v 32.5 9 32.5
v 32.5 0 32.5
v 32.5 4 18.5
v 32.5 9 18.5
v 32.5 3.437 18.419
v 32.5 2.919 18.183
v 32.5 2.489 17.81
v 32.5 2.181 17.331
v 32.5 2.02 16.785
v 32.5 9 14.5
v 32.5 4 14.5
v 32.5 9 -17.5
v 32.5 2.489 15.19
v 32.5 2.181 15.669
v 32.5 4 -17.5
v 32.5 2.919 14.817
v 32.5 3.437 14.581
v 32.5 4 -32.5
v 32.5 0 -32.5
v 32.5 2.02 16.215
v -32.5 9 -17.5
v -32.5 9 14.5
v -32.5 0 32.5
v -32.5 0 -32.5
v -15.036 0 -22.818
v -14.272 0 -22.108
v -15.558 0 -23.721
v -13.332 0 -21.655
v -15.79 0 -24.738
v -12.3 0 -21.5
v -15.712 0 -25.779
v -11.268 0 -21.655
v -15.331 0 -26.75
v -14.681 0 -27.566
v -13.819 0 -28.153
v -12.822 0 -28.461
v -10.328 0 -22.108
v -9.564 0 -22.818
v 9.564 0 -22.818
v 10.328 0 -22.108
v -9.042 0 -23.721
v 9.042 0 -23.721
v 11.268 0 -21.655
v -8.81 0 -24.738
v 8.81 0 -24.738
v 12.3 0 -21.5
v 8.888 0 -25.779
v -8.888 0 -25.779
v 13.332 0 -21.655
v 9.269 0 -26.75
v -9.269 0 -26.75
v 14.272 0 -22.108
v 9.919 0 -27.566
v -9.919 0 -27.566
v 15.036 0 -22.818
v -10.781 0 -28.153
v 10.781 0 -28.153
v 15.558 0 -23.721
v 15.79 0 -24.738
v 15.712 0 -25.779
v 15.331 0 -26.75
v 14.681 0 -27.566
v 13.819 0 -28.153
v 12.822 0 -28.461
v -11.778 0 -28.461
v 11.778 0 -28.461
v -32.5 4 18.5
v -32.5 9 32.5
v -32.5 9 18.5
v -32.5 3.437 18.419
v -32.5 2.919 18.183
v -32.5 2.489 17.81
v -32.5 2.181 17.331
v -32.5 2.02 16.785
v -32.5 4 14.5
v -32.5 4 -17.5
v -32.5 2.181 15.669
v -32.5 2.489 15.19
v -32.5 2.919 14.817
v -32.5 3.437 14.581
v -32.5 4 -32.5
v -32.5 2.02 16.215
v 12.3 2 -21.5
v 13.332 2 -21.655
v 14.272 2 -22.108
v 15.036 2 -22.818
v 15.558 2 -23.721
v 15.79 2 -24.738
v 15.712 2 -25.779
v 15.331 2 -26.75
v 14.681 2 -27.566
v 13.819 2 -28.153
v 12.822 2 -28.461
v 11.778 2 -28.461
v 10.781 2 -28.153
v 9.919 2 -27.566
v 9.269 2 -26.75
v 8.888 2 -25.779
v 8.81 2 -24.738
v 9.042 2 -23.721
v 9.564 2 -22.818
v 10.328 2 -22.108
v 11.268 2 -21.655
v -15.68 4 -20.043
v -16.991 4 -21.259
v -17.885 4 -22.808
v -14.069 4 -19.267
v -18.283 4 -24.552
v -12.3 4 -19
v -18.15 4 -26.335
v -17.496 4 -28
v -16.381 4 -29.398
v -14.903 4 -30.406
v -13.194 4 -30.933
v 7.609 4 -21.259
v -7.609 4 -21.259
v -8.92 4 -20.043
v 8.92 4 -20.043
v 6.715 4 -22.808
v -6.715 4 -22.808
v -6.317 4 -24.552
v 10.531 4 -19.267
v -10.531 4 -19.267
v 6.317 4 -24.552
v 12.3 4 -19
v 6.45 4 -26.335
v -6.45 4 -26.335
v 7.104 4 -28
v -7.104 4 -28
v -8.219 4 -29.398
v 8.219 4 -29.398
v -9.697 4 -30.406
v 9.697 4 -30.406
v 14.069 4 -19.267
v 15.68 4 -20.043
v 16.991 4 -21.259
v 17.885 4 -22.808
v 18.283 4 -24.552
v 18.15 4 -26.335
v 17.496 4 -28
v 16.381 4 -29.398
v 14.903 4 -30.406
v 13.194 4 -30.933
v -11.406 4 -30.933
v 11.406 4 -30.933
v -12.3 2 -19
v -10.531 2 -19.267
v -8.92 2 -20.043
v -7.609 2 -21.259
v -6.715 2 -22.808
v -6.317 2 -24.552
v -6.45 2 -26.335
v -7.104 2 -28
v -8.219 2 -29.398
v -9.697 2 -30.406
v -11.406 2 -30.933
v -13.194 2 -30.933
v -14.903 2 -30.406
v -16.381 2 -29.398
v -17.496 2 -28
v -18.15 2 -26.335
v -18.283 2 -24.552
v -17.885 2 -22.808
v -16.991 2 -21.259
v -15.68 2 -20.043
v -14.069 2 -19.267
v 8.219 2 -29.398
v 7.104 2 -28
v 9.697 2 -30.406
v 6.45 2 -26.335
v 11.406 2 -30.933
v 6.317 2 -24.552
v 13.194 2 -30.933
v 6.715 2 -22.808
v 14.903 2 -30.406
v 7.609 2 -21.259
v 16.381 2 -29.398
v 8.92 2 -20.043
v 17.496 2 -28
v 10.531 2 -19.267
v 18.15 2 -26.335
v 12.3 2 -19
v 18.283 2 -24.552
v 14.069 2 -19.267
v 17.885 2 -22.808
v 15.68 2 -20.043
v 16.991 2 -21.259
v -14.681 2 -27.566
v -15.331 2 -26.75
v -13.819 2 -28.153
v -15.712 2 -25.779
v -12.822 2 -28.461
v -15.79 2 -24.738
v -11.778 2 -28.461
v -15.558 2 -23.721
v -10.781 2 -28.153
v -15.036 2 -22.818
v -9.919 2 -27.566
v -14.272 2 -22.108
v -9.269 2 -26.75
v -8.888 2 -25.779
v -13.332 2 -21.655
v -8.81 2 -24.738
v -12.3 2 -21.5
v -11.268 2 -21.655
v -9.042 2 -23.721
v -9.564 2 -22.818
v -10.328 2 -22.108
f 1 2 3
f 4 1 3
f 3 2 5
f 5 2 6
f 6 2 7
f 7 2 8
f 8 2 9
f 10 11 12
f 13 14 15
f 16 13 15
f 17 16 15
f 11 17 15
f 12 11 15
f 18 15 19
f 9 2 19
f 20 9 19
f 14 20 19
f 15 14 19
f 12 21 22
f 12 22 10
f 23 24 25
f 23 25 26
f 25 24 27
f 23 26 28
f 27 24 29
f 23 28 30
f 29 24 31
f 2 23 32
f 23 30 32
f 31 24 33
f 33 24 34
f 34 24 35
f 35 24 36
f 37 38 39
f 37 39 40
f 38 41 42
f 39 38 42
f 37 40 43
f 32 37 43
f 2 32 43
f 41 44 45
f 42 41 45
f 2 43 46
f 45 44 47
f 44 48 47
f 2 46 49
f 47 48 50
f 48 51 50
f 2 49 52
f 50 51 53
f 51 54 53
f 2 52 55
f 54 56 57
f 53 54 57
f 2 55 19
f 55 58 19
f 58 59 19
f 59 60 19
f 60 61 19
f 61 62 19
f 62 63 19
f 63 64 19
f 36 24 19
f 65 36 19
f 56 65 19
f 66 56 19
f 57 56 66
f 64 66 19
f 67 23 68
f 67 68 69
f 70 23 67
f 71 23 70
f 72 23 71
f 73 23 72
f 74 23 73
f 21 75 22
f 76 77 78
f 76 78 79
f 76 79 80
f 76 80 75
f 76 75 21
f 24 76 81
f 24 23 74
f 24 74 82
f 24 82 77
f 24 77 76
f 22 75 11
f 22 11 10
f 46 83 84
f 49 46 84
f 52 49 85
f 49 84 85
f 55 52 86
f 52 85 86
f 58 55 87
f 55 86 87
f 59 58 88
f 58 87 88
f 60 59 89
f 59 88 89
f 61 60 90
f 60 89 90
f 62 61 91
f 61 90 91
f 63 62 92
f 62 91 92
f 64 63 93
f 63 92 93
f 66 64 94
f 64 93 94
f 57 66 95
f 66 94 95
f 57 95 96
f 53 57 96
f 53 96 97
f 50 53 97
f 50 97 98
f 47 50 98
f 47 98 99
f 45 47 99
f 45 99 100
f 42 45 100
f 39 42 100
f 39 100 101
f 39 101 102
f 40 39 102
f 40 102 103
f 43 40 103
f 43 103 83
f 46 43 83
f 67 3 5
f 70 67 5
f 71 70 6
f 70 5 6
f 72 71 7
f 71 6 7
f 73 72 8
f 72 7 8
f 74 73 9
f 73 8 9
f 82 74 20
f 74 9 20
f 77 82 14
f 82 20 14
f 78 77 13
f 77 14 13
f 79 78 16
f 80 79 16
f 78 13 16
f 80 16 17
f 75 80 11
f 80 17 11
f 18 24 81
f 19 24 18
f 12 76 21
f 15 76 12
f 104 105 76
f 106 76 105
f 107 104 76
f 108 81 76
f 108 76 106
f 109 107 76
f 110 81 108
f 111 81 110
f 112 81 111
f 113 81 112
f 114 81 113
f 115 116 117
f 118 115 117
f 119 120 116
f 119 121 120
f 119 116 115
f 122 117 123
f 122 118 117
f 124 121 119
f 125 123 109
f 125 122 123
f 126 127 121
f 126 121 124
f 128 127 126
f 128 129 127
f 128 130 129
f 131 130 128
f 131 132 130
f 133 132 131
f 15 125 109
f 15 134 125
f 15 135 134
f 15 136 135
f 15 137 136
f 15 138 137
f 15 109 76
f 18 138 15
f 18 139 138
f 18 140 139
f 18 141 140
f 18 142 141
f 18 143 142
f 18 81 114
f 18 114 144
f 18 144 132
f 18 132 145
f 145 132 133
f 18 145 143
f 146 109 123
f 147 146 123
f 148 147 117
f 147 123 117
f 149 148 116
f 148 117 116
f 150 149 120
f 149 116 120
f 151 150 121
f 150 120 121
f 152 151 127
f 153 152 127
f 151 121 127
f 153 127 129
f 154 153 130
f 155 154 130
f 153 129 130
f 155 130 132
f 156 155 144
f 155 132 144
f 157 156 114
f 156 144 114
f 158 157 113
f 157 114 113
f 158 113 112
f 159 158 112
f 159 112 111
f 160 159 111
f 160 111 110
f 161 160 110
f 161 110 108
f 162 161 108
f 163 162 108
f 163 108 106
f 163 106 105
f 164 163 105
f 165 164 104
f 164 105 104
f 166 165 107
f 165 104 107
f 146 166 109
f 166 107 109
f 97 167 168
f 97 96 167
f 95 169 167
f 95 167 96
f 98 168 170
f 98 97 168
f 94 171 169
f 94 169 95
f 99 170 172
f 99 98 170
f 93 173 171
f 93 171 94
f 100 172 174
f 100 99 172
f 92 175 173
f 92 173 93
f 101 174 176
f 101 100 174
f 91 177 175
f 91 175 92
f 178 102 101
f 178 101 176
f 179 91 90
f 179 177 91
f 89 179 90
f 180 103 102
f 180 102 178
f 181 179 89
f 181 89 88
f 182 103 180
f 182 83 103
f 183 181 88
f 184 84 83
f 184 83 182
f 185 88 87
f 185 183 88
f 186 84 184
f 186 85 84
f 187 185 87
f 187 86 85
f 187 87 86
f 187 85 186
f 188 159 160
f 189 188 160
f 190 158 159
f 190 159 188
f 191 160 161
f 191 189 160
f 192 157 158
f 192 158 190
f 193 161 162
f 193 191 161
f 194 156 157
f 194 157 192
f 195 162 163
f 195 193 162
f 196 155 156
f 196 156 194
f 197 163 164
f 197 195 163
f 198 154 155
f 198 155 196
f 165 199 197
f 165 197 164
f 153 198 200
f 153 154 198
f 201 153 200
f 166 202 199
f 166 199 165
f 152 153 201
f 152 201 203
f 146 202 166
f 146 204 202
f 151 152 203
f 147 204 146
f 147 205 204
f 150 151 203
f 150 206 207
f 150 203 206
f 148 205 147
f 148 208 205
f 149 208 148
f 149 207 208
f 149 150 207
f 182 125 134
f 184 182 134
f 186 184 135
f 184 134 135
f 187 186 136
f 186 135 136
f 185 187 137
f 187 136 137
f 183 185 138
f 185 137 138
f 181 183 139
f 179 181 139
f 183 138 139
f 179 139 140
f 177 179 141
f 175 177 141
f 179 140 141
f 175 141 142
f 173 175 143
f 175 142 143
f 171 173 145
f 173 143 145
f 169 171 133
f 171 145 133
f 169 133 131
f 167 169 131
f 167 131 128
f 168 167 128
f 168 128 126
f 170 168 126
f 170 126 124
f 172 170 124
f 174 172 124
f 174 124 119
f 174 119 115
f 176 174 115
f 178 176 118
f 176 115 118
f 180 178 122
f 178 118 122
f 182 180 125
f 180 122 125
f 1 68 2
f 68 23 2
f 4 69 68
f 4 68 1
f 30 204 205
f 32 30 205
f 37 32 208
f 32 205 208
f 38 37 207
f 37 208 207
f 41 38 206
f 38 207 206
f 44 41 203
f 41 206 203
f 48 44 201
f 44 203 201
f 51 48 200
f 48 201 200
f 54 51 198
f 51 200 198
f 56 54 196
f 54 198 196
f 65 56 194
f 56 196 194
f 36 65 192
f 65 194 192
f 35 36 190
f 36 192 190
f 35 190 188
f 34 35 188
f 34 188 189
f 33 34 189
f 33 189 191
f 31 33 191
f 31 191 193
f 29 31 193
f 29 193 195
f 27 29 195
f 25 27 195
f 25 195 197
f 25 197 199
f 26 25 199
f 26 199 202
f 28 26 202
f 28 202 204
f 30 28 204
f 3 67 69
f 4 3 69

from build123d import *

# Parameters (mm, degrees)
SKETCH_1_W          = 65
SKETCH_1_H          = 65
EXTRUDE_1_DEPTH     = 4
SKETCH_2_R          = 3.5
CUT_EXTRUDE_1_DEPTH = 47.135669498
SKETCH_3_R          = 6
CUT_EXTRUDE_2_DEPTH = 2
SKETCH_4_W          = 65
SKETCH_4_H          = 50
EXTRUDE_2_DEPTH     = 5
SKETCH_5_W          = 4
SKETCH_5_H          = 5
CUT_EXTRUDE_3_DEPTH = 74.227385588
SKETCH_6_R          = 2
CUT_EXTRUDE_4_DEPTH = 74.227385588


with BuildPart() as part:
    # 草图1 → 凸台-拉伸1 (new body)
    with BuildSketch(Plane(origin=(0, 0, 0), x_dir=(1, 0, 0), z_dir=(0, 1, 0))):
        Rectangle(SKETCH_1_W, SKETCH_1_H)
    extrude(amount=EXTRUDE_1_DEPTH)

    # 草图2 → 切除-拉伸1 (cut, through all)
    with BuildSketch(Plane(origin=(0, 4, 0), x_dir=(1, 0, 0), z_dir=(0, 1, 0))):
        with Locations(Location((-12.3, 25, 0), (0, 0, 270))):
            Circle(SKETCH_2_R)
        with Locations(Location((12.3, 25, 0), (0, 0, 270))):
            Circle(SKETCH_2_R)
    extrude(amount=-CUT_EXTRUDE_1_DEPTH, mode=Mode.SUBTRACT)

    # 草图3 → 切除-拉伸2 (cut)
    with BuildSketch(Plane(origin=(0, 4, 0), x_dir=(1, 0, 0), z_dir=(0, 1, 0))):
        with Locations(Location((-12.3, 25, 0), (0, 0, 270))):
            Circle(SKETCH_3_R)
        with Locations(Location((12.3, 25, 0), (0, 0, 270))):
            Circle(SKETCH_3_R)
    extrude(amount=-CUT_EXTRUDE_2_DEPTH, mode=Mode.SUBTRACT)

    # 草图4 → 凸台-拉伸2 (add)
    with BuildSketch(Plane(origin=(0, 4, 0), x_dir=(1, 0, 0), z_dir=(0, 1, 0))):
        with Locations((0, -7.5)):
            Rectangle(SKETCH_4_W, SKETCH_4_H)
    extrude(amount=EXTRUDE_2_DEPTH)

    # 草图5 → 切除-拉伸3 (cut, through all)
    with BuildSketch(Plane(origin=(32.5, 0, 0), x_dir=(0, 0, -1), z_dir=(1, 0, 0))):
        with Locations((-16.5, 6.5)):
            Rectangle(SKETCH_5_W, SKETCH_5_H)
    extrude(amount=-CUT_EXTRUDE_3_DEPTH, mode=Mode.SUBTRACT)

    # 草图6 → 切除-拉伸4 (cut, through all)
    with BuildSketch(Plane(origin=(32.5, 0, 0), x_dir=(0, 0, -1), z_dir=(1, 0, 0))):
        with Locations((-16.5, 4)):
            Circle(SKETCH_6_R)
    extrude(amount=-CUT_EXTRUDE_4_DEPTH, mode=Mode.SUBTRACT)


solid = part.part
